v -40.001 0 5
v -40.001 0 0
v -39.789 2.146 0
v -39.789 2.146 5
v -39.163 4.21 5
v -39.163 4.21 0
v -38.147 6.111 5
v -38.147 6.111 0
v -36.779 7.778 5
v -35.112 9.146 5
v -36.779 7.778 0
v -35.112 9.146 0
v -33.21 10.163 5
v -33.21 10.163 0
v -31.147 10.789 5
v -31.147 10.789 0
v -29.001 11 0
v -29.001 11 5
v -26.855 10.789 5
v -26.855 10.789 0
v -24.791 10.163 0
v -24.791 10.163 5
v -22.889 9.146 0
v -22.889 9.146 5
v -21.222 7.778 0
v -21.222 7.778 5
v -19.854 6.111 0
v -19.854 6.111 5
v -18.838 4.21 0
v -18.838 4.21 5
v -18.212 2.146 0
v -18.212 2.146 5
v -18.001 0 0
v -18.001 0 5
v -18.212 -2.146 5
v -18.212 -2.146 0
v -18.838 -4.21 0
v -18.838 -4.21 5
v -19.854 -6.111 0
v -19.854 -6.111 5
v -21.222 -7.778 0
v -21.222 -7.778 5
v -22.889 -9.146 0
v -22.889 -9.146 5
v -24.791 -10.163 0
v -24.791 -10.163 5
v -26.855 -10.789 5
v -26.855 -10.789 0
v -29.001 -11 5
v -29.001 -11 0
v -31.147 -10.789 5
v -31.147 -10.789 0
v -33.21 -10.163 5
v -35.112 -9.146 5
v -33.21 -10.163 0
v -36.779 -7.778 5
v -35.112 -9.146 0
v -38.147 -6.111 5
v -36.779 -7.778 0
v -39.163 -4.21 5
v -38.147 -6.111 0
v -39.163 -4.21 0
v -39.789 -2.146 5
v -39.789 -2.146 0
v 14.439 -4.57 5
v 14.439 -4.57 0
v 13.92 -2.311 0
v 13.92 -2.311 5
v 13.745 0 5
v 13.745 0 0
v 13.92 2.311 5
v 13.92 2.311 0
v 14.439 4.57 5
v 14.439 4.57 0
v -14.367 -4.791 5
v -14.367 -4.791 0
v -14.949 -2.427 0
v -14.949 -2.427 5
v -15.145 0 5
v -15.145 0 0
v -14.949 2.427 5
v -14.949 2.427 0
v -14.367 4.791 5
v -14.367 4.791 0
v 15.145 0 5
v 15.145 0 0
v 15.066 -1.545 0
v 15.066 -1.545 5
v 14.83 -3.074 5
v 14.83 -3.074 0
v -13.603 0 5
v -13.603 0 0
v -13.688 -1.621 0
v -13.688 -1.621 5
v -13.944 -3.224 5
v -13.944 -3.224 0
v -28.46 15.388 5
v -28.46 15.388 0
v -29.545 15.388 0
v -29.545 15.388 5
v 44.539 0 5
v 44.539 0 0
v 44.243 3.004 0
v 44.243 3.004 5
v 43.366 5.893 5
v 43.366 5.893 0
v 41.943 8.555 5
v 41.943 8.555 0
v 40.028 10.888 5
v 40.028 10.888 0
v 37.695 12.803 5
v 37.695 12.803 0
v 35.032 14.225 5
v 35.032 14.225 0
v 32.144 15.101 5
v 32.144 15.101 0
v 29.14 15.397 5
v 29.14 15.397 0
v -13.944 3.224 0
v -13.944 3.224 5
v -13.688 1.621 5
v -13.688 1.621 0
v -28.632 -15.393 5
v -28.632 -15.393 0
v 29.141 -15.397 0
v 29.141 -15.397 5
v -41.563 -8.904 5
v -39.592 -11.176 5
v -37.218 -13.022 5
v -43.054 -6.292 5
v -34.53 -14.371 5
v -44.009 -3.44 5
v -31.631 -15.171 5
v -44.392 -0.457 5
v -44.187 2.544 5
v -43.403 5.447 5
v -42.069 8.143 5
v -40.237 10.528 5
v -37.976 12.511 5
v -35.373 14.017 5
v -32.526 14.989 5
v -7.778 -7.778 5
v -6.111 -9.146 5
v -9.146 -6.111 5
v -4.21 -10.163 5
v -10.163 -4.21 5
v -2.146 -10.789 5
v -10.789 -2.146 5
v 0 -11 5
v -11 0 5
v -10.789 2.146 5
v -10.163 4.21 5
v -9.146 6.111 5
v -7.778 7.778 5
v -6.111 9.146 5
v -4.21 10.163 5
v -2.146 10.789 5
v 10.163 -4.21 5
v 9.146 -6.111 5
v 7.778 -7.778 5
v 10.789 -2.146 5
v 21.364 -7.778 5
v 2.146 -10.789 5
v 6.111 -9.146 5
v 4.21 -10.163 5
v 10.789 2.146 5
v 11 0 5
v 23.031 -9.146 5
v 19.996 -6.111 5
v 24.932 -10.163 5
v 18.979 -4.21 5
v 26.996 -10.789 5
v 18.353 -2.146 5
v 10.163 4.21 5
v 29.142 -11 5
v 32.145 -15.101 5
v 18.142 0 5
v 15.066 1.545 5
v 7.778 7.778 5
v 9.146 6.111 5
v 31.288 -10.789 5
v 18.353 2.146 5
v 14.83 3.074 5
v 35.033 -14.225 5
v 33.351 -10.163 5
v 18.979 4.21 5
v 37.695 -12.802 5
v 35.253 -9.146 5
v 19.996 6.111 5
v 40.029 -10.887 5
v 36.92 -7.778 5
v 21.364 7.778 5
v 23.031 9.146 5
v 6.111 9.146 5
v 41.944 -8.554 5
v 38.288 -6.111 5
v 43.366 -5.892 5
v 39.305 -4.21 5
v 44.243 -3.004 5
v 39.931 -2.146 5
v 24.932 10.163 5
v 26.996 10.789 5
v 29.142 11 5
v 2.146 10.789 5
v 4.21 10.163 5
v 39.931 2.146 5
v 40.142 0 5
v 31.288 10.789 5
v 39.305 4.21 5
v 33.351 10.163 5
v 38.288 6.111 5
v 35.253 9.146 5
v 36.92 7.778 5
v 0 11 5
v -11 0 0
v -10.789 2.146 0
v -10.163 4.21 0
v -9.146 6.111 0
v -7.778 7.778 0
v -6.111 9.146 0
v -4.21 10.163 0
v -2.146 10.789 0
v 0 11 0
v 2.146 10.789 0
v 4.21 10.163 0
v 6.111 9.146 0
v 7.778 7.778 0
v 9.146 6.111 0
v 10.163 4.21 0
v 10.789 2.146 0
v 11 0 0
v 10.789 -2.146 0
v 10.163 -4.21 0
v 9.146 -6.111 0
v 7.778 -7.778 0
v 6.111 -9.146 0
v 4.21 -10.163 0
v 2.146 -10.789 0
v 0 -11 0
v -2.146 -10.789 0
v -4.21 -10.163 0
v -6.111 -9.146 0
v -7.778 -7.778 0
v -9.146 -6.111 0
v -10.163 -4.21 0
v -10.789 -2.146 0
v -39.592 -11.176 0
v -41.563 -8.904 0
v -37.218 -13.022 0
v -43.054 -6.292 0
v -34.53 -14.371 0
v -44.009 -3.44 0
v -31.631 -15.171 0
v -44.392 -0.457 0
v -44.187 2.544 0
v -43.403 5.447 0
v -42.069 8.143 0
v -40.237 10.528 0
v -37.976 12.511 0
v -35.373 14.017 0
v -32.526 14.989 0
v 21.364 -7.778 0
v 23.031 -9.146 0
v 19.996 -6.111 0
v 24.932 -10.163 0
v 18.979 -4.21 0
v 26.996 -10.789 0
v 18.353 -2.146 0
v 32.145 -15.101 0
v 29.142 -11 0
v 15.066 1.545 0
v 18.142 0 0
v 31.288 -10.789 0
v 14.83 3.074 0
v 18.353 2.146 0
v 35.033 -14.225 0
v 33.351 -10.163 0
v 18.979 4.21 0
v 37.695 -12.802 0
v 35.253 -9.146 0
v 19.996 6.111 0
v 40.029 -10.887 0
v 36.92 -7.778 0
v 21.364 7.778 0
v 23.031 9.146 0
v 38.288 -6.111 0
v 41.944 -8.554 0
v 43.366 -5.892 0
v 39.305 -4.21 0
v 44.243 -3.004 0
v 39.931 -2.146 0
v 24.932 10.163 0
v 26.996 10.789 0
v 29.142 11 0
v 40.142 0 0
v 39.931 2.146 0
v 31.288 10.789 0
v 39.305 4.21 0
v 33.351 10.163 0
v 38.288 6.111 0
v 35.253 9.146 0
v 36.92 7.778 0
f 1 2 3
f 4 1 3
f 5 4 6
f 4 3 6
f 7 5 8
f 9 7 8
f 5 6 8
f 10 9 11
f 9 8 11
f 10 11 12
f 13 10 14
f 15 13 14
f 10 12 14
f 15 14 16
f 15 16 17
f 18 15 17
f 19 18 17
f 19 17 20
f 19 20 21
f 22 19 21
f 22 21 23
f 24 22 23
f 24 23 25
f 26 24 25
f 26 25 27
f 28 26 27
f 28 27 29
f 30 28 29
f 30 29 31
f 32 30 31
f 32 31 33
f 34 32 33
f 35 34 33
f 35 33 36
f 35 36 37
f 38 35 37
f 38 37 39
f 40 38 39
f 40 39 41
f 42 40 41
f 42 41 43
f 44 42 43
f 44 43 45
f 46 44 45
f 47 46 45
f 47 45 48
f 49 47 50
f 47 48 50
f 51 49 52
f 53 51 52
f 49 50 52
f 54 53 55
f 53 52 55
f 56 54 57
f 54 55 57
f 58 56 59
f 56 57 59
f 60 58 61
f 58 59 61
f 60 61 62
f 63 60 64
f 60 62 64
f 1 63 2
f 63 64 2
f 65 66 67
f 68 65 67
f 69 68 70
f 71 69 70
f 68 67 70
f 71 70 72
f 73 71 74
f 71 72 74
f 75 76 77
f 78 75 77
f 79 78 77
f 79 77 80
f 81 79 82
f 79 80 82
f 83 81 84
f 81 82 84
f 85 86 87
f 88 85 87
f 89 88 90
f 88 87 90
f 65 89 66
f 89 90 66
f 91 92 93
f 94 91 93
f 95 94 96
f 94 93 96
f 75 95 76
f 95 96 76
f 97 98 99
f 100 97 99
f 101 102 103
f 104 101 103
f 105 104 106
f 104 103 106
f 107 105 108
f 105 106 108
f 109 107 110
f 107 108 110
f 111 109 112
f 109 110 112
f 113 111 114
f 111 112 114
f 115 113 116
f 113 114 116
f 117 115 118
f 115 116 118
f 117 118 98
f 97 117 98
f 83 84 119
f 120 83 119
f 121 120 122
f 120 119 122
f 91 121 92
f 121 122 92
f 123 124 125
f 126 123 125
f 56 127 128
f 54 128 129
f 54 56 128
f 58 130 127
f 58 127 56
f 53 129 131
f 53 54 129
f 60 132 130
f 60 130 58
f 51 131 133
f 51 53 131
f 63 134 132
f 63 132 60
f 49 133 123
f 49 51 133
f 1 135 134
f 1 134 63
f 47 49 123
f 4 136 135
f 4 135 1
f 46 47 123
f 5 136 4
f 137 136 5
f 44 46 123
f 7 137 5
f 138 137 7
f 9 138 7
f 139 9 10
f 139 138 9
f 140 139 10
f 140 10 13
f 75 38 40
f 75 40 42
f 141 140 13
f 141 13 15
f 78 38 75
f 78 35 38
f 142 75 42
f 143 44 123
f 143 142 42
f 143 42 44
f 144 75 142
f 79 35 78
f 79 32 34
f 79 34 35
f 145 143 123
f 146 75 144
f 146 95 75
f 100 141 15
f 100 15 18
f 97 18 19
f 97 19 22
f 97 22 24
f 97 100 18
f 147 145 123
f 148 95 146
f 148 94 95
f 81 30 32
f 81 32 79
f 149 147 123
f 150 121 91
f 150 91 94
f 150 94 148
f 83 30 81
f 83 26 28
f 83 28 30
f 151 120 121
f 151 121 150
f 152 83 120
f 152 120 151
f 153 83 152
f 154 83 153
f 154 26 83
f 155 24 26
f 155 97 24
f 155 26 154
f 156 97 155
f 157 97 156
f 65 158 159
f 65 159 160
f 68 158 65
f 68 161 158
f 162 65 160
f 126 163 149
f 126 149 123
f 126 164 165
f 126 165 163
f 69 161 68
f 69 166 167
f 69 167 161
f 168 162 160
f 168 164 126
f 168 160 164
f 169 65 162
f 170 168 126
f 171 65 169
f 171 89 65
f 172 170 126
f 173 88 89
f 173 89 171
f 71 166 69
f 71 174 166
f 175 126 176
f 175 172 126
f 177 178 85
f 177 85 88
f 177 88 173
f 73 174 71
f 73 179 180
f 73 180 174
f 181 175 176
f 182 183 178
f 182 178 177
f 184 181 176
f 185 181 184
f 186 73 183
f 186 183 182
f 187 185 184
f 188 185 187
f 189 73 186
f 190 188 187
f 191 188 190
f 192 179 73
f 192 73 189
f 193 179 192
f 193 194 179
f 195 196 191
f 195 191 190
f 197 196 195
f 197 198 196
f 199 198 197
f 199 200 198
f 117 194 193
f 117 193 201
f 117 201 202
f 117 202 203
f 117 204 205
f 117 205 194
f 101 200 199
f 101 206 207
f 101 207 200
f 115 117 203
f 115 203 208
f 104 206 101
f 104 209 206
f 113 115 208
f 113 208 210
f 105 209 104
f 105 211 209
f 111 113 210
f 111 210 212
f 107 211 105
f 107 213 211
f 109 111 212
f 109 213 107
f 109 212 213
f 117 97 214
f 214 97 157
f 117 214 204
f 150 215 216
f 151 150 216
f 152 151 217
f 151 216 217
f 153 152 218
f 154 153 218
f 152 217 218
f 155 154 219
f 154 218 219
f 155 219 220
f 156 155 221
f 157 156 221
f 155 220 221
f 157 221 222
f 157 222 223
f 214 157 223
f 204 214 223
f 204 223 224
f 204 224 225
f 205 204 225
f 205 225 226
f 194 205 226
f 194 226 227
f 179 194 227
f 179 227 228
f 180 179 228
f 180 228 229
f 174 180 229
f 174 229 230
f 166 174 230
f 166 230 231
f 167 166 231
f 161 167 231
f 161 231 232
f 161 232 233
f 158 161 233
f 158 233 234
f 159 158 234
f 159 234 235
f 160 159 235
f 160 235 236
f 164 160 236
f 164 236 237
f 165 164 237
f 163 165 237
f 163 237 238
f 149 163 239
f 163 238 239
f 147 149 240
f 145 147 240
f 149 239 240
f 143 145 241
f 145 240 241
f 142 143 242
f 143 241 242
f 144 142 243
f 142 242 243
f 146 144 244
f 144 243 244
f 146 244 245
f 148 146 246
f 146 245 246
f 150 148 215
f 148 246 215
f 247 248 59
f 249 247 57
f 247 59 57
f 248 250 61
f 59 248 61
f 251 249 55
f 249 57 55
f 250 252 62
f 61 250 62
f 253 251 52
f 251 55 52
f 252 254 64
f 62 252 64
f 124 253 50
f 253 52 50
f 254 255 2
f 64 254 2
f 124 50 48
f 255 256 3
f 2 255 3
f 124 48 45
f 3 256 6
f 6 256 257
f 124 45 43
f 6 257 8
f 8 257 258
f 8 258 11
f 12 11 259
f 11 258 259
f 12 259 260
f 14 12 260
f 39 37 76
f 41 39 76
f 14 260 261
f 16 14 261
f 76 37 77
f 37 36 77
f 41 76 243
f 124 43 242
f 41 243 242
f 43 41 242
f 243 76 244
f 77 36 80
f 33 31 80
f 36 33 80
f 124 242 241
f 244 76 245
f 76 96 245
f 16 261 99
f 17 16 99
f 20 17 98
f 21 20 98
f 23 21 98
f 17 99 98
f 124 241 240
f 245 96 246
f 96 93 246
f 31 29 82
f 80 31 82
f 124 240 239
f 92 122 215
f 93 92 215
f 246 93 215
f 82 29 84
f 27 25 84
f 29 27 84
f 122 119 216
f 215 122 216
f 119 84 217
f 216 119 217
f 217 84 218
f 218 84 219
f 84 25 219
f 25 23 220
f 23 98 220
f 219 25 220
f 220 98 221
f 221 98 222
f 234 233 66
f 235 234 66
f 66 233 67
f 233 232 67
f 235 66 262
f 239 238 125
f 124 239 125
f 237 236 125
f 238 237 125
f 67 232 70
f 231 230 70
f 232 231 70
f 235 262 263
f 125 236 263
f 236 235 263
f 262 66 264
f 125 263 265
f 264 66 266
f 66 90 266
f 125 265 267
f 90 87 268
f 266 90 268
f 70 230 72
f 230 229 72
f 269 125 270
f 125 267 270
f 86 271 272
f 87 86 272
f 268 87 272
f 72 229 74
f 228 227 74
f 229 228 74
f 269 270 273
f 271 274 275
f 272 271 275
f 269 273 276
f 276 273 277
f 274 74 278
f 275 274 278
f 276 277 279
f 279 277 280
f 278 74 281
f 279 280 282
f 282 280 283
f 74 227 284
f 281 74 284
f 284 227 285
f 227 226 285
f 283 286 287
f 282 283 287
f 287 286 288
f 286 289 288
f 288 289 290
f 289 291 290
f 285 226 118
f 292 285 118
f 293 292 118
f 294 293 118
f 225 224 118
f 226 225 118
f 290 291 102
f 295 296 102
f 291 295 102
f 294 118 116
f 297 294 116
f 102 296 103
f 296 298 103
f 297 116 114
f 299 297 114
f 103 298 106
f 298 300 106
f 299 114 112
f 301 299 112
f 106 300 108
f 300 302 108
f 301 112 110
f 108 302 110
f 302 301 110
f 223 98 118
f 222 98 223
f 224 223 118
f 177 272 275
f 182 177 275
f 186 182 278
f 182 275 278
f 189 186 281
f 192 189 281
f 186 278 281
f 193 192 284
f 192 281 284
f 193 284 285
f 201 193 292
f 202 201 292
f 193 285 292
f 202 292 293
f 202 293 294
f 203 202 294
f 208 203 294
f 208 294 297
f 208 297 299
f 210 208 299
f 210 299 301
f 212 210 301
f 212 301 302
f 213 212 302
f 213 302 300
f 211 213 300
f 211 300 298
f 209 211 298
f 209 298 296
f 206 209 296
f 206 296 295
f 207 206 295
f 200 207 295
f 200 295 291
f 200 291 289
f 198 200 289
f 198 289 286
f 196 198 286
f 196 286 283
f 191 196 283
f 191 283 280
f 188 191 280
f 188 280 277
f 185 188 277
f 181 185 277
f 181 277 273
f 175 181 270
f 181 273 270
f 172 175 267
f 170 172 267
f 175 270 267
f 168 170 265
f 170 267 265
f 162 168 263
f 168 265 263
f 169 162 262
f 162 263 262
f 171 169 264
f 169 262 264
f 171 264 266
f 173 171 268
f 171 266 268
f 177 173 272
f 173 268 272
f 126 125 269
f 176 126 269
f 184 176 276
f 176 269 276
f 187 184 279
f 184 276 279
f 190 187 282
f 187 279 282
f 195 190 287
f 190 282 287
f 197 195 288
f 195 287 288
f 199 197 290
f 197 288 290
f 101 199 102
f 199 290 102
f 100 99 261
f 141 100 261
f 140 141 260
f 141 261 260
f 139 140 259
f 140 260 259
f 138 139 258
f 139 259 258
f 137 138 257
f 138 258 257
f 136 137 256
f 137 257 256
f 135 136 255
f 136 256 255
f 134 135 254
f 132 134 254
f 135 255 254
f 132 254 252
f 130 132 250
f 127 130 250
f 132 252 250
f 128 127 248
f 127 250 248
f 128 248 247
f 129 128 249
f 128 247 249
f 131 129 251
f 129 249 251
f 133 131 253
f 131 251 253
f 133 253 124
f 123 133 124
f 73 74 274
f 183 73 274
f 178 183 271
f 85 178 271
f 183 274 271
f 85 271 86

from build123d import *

# Parameters (mm, degrees)
F1_DEPTH = 5
F3_D     = 22
F5_D     = 22
F7_D     = 22


with BuildPart() as f1:
    # F0 (on Top) → F1 (new body)
    with BuildSketch(Plane.XY):
        with BuildLine():
            ThreePointArc((14.439225008, -4.5701776484), (13.7453052389, 0), (14.439225008, 4.5701776484))
            ThreePointArc((14.4392250081, 4.5701776484), (0.116311071, 15.1447751487), (-14.3673285073, 4.7914104535))
            ThreePointArc((-14.3673285073, 4.7914104535), (-13.7951814402, 2.4260059517), (-13.602864396, 0))
            ThreePointArc((-13.602864396, 0), (-13.7951814402, -2.4260059517), (-14.3673285073, -4.7914104535))
            ThreePointArc((-14.3673285073, -4.7914104535), (0.116311071, -15.1447751487), (14.4392250081, -4.5701776484))
        make_face()
        with BuildLine():
            ThreePointArc((-14.3673285073, -4.7914104535), (-15.1452217736, 0), (-14.3673285073, 4.7914104535))
            ThreePointArc((-14.3673285073, 4.7914104535), (-19.7467605123, 12.306770976), (-28.4601684953, 15.3882403981))
            Line((-28.4601684953, 15.3882403981), (-29.545495717, 15.3880823672))
            ThreePointArc((-29.545495717, 15.3880823672), (-44.3915356245, -0.4569880798), (-28.6315344711, -15.3933036246))
            ThreePointArc((-28.6315344711, -15.3933036246), (-19.8154166919, -12.3580970844), (-14.3673285073, -4.7914104535))
        make_face()
        with BuildLine():
            ThreePointArc((29.1410469099, -15.3966274615), (20.0122054796, -12.3977505372), (14.439225008, -4.5701776484))
            ThreePointArc((14.4392250081, -4.5701776484), (0.116311071, -15.1447751487), (-14.3673285073, -4.7914104535))
            ThreePointArc((-14.3673285073, -4.7914104535), (-19.8154166919, -12.3580970844), (-28.6315344711, -15.3933036246))
            Line((-28.6315344711, -15.3933036246), (29.1410469099, -15.3966274615))
        make_face()
        with BuildLine():
            ThreePointArc((-14.3673285073, 4.7914104535), (0.116311071, 15.1447751487), (14.4392250081, 4.5701776484))
            ThreePointArc((14.439225008, 4.5701776484), (20.0116595313, 12.3973484813), (29.1396908737, 15.3966273238))
            Line((29.1396908737, 15.3966273238), (-28.4601684953, 15.3882403981))
            ThreePointArc((-28.4601684953, 15.3882403981), (-19.7467605123, 12.306770976), (-14.3673285073, 4.7914104535))
        make_face()
        with BuildLine():
            ThreePointArc((14.4392250081, 4.5701776484), (14.9676819774, 2.3121935024), (15.1452217736, 0))
            ThreePointArc((15.1452217736, 0), (14.9676819774, -2.3121935024), (14.4392250081, -4.5701776484))
            ThreePointArc((14.439225008, -4.5701776484), (20.0122054796, -12.3977505372), (29.1410469099, -15.3966274615))
            ThreePointArc((29.1410469099, -15.3966274615), (40.0286792416, -10.8873728822), (44.5385602129, 0))
            ThreePointArc((44.5385602129, 0), (40.0281997861, 10.8878522891), (29.1396908737, 15.3966273238))
            ThreePointArc((29.1396908737, 15.3966273238), (20.0116595313, 12.3973484813), (14.439225008, 4.5701776484))
        make_face()
    extrude(amount=F1_DEPTH)

    # F3 (through all)
    with Locations(Plane.XY.offset(5)):
        with Locations((-29.0005914867, 0)):
            Hole(F3_D / 2)

    # F5 (through all)
    with Locations(Plane.XY.offset(5)):
        with Locations((0, 0)):
            Hole(F5_D / 2)

    # F7 (through all)
    with Locations(Plane.XY.offset(5)):
        with Locations((29.1419327259, 0)):
            Hole(F7_D / 2)


solid = f1.part
